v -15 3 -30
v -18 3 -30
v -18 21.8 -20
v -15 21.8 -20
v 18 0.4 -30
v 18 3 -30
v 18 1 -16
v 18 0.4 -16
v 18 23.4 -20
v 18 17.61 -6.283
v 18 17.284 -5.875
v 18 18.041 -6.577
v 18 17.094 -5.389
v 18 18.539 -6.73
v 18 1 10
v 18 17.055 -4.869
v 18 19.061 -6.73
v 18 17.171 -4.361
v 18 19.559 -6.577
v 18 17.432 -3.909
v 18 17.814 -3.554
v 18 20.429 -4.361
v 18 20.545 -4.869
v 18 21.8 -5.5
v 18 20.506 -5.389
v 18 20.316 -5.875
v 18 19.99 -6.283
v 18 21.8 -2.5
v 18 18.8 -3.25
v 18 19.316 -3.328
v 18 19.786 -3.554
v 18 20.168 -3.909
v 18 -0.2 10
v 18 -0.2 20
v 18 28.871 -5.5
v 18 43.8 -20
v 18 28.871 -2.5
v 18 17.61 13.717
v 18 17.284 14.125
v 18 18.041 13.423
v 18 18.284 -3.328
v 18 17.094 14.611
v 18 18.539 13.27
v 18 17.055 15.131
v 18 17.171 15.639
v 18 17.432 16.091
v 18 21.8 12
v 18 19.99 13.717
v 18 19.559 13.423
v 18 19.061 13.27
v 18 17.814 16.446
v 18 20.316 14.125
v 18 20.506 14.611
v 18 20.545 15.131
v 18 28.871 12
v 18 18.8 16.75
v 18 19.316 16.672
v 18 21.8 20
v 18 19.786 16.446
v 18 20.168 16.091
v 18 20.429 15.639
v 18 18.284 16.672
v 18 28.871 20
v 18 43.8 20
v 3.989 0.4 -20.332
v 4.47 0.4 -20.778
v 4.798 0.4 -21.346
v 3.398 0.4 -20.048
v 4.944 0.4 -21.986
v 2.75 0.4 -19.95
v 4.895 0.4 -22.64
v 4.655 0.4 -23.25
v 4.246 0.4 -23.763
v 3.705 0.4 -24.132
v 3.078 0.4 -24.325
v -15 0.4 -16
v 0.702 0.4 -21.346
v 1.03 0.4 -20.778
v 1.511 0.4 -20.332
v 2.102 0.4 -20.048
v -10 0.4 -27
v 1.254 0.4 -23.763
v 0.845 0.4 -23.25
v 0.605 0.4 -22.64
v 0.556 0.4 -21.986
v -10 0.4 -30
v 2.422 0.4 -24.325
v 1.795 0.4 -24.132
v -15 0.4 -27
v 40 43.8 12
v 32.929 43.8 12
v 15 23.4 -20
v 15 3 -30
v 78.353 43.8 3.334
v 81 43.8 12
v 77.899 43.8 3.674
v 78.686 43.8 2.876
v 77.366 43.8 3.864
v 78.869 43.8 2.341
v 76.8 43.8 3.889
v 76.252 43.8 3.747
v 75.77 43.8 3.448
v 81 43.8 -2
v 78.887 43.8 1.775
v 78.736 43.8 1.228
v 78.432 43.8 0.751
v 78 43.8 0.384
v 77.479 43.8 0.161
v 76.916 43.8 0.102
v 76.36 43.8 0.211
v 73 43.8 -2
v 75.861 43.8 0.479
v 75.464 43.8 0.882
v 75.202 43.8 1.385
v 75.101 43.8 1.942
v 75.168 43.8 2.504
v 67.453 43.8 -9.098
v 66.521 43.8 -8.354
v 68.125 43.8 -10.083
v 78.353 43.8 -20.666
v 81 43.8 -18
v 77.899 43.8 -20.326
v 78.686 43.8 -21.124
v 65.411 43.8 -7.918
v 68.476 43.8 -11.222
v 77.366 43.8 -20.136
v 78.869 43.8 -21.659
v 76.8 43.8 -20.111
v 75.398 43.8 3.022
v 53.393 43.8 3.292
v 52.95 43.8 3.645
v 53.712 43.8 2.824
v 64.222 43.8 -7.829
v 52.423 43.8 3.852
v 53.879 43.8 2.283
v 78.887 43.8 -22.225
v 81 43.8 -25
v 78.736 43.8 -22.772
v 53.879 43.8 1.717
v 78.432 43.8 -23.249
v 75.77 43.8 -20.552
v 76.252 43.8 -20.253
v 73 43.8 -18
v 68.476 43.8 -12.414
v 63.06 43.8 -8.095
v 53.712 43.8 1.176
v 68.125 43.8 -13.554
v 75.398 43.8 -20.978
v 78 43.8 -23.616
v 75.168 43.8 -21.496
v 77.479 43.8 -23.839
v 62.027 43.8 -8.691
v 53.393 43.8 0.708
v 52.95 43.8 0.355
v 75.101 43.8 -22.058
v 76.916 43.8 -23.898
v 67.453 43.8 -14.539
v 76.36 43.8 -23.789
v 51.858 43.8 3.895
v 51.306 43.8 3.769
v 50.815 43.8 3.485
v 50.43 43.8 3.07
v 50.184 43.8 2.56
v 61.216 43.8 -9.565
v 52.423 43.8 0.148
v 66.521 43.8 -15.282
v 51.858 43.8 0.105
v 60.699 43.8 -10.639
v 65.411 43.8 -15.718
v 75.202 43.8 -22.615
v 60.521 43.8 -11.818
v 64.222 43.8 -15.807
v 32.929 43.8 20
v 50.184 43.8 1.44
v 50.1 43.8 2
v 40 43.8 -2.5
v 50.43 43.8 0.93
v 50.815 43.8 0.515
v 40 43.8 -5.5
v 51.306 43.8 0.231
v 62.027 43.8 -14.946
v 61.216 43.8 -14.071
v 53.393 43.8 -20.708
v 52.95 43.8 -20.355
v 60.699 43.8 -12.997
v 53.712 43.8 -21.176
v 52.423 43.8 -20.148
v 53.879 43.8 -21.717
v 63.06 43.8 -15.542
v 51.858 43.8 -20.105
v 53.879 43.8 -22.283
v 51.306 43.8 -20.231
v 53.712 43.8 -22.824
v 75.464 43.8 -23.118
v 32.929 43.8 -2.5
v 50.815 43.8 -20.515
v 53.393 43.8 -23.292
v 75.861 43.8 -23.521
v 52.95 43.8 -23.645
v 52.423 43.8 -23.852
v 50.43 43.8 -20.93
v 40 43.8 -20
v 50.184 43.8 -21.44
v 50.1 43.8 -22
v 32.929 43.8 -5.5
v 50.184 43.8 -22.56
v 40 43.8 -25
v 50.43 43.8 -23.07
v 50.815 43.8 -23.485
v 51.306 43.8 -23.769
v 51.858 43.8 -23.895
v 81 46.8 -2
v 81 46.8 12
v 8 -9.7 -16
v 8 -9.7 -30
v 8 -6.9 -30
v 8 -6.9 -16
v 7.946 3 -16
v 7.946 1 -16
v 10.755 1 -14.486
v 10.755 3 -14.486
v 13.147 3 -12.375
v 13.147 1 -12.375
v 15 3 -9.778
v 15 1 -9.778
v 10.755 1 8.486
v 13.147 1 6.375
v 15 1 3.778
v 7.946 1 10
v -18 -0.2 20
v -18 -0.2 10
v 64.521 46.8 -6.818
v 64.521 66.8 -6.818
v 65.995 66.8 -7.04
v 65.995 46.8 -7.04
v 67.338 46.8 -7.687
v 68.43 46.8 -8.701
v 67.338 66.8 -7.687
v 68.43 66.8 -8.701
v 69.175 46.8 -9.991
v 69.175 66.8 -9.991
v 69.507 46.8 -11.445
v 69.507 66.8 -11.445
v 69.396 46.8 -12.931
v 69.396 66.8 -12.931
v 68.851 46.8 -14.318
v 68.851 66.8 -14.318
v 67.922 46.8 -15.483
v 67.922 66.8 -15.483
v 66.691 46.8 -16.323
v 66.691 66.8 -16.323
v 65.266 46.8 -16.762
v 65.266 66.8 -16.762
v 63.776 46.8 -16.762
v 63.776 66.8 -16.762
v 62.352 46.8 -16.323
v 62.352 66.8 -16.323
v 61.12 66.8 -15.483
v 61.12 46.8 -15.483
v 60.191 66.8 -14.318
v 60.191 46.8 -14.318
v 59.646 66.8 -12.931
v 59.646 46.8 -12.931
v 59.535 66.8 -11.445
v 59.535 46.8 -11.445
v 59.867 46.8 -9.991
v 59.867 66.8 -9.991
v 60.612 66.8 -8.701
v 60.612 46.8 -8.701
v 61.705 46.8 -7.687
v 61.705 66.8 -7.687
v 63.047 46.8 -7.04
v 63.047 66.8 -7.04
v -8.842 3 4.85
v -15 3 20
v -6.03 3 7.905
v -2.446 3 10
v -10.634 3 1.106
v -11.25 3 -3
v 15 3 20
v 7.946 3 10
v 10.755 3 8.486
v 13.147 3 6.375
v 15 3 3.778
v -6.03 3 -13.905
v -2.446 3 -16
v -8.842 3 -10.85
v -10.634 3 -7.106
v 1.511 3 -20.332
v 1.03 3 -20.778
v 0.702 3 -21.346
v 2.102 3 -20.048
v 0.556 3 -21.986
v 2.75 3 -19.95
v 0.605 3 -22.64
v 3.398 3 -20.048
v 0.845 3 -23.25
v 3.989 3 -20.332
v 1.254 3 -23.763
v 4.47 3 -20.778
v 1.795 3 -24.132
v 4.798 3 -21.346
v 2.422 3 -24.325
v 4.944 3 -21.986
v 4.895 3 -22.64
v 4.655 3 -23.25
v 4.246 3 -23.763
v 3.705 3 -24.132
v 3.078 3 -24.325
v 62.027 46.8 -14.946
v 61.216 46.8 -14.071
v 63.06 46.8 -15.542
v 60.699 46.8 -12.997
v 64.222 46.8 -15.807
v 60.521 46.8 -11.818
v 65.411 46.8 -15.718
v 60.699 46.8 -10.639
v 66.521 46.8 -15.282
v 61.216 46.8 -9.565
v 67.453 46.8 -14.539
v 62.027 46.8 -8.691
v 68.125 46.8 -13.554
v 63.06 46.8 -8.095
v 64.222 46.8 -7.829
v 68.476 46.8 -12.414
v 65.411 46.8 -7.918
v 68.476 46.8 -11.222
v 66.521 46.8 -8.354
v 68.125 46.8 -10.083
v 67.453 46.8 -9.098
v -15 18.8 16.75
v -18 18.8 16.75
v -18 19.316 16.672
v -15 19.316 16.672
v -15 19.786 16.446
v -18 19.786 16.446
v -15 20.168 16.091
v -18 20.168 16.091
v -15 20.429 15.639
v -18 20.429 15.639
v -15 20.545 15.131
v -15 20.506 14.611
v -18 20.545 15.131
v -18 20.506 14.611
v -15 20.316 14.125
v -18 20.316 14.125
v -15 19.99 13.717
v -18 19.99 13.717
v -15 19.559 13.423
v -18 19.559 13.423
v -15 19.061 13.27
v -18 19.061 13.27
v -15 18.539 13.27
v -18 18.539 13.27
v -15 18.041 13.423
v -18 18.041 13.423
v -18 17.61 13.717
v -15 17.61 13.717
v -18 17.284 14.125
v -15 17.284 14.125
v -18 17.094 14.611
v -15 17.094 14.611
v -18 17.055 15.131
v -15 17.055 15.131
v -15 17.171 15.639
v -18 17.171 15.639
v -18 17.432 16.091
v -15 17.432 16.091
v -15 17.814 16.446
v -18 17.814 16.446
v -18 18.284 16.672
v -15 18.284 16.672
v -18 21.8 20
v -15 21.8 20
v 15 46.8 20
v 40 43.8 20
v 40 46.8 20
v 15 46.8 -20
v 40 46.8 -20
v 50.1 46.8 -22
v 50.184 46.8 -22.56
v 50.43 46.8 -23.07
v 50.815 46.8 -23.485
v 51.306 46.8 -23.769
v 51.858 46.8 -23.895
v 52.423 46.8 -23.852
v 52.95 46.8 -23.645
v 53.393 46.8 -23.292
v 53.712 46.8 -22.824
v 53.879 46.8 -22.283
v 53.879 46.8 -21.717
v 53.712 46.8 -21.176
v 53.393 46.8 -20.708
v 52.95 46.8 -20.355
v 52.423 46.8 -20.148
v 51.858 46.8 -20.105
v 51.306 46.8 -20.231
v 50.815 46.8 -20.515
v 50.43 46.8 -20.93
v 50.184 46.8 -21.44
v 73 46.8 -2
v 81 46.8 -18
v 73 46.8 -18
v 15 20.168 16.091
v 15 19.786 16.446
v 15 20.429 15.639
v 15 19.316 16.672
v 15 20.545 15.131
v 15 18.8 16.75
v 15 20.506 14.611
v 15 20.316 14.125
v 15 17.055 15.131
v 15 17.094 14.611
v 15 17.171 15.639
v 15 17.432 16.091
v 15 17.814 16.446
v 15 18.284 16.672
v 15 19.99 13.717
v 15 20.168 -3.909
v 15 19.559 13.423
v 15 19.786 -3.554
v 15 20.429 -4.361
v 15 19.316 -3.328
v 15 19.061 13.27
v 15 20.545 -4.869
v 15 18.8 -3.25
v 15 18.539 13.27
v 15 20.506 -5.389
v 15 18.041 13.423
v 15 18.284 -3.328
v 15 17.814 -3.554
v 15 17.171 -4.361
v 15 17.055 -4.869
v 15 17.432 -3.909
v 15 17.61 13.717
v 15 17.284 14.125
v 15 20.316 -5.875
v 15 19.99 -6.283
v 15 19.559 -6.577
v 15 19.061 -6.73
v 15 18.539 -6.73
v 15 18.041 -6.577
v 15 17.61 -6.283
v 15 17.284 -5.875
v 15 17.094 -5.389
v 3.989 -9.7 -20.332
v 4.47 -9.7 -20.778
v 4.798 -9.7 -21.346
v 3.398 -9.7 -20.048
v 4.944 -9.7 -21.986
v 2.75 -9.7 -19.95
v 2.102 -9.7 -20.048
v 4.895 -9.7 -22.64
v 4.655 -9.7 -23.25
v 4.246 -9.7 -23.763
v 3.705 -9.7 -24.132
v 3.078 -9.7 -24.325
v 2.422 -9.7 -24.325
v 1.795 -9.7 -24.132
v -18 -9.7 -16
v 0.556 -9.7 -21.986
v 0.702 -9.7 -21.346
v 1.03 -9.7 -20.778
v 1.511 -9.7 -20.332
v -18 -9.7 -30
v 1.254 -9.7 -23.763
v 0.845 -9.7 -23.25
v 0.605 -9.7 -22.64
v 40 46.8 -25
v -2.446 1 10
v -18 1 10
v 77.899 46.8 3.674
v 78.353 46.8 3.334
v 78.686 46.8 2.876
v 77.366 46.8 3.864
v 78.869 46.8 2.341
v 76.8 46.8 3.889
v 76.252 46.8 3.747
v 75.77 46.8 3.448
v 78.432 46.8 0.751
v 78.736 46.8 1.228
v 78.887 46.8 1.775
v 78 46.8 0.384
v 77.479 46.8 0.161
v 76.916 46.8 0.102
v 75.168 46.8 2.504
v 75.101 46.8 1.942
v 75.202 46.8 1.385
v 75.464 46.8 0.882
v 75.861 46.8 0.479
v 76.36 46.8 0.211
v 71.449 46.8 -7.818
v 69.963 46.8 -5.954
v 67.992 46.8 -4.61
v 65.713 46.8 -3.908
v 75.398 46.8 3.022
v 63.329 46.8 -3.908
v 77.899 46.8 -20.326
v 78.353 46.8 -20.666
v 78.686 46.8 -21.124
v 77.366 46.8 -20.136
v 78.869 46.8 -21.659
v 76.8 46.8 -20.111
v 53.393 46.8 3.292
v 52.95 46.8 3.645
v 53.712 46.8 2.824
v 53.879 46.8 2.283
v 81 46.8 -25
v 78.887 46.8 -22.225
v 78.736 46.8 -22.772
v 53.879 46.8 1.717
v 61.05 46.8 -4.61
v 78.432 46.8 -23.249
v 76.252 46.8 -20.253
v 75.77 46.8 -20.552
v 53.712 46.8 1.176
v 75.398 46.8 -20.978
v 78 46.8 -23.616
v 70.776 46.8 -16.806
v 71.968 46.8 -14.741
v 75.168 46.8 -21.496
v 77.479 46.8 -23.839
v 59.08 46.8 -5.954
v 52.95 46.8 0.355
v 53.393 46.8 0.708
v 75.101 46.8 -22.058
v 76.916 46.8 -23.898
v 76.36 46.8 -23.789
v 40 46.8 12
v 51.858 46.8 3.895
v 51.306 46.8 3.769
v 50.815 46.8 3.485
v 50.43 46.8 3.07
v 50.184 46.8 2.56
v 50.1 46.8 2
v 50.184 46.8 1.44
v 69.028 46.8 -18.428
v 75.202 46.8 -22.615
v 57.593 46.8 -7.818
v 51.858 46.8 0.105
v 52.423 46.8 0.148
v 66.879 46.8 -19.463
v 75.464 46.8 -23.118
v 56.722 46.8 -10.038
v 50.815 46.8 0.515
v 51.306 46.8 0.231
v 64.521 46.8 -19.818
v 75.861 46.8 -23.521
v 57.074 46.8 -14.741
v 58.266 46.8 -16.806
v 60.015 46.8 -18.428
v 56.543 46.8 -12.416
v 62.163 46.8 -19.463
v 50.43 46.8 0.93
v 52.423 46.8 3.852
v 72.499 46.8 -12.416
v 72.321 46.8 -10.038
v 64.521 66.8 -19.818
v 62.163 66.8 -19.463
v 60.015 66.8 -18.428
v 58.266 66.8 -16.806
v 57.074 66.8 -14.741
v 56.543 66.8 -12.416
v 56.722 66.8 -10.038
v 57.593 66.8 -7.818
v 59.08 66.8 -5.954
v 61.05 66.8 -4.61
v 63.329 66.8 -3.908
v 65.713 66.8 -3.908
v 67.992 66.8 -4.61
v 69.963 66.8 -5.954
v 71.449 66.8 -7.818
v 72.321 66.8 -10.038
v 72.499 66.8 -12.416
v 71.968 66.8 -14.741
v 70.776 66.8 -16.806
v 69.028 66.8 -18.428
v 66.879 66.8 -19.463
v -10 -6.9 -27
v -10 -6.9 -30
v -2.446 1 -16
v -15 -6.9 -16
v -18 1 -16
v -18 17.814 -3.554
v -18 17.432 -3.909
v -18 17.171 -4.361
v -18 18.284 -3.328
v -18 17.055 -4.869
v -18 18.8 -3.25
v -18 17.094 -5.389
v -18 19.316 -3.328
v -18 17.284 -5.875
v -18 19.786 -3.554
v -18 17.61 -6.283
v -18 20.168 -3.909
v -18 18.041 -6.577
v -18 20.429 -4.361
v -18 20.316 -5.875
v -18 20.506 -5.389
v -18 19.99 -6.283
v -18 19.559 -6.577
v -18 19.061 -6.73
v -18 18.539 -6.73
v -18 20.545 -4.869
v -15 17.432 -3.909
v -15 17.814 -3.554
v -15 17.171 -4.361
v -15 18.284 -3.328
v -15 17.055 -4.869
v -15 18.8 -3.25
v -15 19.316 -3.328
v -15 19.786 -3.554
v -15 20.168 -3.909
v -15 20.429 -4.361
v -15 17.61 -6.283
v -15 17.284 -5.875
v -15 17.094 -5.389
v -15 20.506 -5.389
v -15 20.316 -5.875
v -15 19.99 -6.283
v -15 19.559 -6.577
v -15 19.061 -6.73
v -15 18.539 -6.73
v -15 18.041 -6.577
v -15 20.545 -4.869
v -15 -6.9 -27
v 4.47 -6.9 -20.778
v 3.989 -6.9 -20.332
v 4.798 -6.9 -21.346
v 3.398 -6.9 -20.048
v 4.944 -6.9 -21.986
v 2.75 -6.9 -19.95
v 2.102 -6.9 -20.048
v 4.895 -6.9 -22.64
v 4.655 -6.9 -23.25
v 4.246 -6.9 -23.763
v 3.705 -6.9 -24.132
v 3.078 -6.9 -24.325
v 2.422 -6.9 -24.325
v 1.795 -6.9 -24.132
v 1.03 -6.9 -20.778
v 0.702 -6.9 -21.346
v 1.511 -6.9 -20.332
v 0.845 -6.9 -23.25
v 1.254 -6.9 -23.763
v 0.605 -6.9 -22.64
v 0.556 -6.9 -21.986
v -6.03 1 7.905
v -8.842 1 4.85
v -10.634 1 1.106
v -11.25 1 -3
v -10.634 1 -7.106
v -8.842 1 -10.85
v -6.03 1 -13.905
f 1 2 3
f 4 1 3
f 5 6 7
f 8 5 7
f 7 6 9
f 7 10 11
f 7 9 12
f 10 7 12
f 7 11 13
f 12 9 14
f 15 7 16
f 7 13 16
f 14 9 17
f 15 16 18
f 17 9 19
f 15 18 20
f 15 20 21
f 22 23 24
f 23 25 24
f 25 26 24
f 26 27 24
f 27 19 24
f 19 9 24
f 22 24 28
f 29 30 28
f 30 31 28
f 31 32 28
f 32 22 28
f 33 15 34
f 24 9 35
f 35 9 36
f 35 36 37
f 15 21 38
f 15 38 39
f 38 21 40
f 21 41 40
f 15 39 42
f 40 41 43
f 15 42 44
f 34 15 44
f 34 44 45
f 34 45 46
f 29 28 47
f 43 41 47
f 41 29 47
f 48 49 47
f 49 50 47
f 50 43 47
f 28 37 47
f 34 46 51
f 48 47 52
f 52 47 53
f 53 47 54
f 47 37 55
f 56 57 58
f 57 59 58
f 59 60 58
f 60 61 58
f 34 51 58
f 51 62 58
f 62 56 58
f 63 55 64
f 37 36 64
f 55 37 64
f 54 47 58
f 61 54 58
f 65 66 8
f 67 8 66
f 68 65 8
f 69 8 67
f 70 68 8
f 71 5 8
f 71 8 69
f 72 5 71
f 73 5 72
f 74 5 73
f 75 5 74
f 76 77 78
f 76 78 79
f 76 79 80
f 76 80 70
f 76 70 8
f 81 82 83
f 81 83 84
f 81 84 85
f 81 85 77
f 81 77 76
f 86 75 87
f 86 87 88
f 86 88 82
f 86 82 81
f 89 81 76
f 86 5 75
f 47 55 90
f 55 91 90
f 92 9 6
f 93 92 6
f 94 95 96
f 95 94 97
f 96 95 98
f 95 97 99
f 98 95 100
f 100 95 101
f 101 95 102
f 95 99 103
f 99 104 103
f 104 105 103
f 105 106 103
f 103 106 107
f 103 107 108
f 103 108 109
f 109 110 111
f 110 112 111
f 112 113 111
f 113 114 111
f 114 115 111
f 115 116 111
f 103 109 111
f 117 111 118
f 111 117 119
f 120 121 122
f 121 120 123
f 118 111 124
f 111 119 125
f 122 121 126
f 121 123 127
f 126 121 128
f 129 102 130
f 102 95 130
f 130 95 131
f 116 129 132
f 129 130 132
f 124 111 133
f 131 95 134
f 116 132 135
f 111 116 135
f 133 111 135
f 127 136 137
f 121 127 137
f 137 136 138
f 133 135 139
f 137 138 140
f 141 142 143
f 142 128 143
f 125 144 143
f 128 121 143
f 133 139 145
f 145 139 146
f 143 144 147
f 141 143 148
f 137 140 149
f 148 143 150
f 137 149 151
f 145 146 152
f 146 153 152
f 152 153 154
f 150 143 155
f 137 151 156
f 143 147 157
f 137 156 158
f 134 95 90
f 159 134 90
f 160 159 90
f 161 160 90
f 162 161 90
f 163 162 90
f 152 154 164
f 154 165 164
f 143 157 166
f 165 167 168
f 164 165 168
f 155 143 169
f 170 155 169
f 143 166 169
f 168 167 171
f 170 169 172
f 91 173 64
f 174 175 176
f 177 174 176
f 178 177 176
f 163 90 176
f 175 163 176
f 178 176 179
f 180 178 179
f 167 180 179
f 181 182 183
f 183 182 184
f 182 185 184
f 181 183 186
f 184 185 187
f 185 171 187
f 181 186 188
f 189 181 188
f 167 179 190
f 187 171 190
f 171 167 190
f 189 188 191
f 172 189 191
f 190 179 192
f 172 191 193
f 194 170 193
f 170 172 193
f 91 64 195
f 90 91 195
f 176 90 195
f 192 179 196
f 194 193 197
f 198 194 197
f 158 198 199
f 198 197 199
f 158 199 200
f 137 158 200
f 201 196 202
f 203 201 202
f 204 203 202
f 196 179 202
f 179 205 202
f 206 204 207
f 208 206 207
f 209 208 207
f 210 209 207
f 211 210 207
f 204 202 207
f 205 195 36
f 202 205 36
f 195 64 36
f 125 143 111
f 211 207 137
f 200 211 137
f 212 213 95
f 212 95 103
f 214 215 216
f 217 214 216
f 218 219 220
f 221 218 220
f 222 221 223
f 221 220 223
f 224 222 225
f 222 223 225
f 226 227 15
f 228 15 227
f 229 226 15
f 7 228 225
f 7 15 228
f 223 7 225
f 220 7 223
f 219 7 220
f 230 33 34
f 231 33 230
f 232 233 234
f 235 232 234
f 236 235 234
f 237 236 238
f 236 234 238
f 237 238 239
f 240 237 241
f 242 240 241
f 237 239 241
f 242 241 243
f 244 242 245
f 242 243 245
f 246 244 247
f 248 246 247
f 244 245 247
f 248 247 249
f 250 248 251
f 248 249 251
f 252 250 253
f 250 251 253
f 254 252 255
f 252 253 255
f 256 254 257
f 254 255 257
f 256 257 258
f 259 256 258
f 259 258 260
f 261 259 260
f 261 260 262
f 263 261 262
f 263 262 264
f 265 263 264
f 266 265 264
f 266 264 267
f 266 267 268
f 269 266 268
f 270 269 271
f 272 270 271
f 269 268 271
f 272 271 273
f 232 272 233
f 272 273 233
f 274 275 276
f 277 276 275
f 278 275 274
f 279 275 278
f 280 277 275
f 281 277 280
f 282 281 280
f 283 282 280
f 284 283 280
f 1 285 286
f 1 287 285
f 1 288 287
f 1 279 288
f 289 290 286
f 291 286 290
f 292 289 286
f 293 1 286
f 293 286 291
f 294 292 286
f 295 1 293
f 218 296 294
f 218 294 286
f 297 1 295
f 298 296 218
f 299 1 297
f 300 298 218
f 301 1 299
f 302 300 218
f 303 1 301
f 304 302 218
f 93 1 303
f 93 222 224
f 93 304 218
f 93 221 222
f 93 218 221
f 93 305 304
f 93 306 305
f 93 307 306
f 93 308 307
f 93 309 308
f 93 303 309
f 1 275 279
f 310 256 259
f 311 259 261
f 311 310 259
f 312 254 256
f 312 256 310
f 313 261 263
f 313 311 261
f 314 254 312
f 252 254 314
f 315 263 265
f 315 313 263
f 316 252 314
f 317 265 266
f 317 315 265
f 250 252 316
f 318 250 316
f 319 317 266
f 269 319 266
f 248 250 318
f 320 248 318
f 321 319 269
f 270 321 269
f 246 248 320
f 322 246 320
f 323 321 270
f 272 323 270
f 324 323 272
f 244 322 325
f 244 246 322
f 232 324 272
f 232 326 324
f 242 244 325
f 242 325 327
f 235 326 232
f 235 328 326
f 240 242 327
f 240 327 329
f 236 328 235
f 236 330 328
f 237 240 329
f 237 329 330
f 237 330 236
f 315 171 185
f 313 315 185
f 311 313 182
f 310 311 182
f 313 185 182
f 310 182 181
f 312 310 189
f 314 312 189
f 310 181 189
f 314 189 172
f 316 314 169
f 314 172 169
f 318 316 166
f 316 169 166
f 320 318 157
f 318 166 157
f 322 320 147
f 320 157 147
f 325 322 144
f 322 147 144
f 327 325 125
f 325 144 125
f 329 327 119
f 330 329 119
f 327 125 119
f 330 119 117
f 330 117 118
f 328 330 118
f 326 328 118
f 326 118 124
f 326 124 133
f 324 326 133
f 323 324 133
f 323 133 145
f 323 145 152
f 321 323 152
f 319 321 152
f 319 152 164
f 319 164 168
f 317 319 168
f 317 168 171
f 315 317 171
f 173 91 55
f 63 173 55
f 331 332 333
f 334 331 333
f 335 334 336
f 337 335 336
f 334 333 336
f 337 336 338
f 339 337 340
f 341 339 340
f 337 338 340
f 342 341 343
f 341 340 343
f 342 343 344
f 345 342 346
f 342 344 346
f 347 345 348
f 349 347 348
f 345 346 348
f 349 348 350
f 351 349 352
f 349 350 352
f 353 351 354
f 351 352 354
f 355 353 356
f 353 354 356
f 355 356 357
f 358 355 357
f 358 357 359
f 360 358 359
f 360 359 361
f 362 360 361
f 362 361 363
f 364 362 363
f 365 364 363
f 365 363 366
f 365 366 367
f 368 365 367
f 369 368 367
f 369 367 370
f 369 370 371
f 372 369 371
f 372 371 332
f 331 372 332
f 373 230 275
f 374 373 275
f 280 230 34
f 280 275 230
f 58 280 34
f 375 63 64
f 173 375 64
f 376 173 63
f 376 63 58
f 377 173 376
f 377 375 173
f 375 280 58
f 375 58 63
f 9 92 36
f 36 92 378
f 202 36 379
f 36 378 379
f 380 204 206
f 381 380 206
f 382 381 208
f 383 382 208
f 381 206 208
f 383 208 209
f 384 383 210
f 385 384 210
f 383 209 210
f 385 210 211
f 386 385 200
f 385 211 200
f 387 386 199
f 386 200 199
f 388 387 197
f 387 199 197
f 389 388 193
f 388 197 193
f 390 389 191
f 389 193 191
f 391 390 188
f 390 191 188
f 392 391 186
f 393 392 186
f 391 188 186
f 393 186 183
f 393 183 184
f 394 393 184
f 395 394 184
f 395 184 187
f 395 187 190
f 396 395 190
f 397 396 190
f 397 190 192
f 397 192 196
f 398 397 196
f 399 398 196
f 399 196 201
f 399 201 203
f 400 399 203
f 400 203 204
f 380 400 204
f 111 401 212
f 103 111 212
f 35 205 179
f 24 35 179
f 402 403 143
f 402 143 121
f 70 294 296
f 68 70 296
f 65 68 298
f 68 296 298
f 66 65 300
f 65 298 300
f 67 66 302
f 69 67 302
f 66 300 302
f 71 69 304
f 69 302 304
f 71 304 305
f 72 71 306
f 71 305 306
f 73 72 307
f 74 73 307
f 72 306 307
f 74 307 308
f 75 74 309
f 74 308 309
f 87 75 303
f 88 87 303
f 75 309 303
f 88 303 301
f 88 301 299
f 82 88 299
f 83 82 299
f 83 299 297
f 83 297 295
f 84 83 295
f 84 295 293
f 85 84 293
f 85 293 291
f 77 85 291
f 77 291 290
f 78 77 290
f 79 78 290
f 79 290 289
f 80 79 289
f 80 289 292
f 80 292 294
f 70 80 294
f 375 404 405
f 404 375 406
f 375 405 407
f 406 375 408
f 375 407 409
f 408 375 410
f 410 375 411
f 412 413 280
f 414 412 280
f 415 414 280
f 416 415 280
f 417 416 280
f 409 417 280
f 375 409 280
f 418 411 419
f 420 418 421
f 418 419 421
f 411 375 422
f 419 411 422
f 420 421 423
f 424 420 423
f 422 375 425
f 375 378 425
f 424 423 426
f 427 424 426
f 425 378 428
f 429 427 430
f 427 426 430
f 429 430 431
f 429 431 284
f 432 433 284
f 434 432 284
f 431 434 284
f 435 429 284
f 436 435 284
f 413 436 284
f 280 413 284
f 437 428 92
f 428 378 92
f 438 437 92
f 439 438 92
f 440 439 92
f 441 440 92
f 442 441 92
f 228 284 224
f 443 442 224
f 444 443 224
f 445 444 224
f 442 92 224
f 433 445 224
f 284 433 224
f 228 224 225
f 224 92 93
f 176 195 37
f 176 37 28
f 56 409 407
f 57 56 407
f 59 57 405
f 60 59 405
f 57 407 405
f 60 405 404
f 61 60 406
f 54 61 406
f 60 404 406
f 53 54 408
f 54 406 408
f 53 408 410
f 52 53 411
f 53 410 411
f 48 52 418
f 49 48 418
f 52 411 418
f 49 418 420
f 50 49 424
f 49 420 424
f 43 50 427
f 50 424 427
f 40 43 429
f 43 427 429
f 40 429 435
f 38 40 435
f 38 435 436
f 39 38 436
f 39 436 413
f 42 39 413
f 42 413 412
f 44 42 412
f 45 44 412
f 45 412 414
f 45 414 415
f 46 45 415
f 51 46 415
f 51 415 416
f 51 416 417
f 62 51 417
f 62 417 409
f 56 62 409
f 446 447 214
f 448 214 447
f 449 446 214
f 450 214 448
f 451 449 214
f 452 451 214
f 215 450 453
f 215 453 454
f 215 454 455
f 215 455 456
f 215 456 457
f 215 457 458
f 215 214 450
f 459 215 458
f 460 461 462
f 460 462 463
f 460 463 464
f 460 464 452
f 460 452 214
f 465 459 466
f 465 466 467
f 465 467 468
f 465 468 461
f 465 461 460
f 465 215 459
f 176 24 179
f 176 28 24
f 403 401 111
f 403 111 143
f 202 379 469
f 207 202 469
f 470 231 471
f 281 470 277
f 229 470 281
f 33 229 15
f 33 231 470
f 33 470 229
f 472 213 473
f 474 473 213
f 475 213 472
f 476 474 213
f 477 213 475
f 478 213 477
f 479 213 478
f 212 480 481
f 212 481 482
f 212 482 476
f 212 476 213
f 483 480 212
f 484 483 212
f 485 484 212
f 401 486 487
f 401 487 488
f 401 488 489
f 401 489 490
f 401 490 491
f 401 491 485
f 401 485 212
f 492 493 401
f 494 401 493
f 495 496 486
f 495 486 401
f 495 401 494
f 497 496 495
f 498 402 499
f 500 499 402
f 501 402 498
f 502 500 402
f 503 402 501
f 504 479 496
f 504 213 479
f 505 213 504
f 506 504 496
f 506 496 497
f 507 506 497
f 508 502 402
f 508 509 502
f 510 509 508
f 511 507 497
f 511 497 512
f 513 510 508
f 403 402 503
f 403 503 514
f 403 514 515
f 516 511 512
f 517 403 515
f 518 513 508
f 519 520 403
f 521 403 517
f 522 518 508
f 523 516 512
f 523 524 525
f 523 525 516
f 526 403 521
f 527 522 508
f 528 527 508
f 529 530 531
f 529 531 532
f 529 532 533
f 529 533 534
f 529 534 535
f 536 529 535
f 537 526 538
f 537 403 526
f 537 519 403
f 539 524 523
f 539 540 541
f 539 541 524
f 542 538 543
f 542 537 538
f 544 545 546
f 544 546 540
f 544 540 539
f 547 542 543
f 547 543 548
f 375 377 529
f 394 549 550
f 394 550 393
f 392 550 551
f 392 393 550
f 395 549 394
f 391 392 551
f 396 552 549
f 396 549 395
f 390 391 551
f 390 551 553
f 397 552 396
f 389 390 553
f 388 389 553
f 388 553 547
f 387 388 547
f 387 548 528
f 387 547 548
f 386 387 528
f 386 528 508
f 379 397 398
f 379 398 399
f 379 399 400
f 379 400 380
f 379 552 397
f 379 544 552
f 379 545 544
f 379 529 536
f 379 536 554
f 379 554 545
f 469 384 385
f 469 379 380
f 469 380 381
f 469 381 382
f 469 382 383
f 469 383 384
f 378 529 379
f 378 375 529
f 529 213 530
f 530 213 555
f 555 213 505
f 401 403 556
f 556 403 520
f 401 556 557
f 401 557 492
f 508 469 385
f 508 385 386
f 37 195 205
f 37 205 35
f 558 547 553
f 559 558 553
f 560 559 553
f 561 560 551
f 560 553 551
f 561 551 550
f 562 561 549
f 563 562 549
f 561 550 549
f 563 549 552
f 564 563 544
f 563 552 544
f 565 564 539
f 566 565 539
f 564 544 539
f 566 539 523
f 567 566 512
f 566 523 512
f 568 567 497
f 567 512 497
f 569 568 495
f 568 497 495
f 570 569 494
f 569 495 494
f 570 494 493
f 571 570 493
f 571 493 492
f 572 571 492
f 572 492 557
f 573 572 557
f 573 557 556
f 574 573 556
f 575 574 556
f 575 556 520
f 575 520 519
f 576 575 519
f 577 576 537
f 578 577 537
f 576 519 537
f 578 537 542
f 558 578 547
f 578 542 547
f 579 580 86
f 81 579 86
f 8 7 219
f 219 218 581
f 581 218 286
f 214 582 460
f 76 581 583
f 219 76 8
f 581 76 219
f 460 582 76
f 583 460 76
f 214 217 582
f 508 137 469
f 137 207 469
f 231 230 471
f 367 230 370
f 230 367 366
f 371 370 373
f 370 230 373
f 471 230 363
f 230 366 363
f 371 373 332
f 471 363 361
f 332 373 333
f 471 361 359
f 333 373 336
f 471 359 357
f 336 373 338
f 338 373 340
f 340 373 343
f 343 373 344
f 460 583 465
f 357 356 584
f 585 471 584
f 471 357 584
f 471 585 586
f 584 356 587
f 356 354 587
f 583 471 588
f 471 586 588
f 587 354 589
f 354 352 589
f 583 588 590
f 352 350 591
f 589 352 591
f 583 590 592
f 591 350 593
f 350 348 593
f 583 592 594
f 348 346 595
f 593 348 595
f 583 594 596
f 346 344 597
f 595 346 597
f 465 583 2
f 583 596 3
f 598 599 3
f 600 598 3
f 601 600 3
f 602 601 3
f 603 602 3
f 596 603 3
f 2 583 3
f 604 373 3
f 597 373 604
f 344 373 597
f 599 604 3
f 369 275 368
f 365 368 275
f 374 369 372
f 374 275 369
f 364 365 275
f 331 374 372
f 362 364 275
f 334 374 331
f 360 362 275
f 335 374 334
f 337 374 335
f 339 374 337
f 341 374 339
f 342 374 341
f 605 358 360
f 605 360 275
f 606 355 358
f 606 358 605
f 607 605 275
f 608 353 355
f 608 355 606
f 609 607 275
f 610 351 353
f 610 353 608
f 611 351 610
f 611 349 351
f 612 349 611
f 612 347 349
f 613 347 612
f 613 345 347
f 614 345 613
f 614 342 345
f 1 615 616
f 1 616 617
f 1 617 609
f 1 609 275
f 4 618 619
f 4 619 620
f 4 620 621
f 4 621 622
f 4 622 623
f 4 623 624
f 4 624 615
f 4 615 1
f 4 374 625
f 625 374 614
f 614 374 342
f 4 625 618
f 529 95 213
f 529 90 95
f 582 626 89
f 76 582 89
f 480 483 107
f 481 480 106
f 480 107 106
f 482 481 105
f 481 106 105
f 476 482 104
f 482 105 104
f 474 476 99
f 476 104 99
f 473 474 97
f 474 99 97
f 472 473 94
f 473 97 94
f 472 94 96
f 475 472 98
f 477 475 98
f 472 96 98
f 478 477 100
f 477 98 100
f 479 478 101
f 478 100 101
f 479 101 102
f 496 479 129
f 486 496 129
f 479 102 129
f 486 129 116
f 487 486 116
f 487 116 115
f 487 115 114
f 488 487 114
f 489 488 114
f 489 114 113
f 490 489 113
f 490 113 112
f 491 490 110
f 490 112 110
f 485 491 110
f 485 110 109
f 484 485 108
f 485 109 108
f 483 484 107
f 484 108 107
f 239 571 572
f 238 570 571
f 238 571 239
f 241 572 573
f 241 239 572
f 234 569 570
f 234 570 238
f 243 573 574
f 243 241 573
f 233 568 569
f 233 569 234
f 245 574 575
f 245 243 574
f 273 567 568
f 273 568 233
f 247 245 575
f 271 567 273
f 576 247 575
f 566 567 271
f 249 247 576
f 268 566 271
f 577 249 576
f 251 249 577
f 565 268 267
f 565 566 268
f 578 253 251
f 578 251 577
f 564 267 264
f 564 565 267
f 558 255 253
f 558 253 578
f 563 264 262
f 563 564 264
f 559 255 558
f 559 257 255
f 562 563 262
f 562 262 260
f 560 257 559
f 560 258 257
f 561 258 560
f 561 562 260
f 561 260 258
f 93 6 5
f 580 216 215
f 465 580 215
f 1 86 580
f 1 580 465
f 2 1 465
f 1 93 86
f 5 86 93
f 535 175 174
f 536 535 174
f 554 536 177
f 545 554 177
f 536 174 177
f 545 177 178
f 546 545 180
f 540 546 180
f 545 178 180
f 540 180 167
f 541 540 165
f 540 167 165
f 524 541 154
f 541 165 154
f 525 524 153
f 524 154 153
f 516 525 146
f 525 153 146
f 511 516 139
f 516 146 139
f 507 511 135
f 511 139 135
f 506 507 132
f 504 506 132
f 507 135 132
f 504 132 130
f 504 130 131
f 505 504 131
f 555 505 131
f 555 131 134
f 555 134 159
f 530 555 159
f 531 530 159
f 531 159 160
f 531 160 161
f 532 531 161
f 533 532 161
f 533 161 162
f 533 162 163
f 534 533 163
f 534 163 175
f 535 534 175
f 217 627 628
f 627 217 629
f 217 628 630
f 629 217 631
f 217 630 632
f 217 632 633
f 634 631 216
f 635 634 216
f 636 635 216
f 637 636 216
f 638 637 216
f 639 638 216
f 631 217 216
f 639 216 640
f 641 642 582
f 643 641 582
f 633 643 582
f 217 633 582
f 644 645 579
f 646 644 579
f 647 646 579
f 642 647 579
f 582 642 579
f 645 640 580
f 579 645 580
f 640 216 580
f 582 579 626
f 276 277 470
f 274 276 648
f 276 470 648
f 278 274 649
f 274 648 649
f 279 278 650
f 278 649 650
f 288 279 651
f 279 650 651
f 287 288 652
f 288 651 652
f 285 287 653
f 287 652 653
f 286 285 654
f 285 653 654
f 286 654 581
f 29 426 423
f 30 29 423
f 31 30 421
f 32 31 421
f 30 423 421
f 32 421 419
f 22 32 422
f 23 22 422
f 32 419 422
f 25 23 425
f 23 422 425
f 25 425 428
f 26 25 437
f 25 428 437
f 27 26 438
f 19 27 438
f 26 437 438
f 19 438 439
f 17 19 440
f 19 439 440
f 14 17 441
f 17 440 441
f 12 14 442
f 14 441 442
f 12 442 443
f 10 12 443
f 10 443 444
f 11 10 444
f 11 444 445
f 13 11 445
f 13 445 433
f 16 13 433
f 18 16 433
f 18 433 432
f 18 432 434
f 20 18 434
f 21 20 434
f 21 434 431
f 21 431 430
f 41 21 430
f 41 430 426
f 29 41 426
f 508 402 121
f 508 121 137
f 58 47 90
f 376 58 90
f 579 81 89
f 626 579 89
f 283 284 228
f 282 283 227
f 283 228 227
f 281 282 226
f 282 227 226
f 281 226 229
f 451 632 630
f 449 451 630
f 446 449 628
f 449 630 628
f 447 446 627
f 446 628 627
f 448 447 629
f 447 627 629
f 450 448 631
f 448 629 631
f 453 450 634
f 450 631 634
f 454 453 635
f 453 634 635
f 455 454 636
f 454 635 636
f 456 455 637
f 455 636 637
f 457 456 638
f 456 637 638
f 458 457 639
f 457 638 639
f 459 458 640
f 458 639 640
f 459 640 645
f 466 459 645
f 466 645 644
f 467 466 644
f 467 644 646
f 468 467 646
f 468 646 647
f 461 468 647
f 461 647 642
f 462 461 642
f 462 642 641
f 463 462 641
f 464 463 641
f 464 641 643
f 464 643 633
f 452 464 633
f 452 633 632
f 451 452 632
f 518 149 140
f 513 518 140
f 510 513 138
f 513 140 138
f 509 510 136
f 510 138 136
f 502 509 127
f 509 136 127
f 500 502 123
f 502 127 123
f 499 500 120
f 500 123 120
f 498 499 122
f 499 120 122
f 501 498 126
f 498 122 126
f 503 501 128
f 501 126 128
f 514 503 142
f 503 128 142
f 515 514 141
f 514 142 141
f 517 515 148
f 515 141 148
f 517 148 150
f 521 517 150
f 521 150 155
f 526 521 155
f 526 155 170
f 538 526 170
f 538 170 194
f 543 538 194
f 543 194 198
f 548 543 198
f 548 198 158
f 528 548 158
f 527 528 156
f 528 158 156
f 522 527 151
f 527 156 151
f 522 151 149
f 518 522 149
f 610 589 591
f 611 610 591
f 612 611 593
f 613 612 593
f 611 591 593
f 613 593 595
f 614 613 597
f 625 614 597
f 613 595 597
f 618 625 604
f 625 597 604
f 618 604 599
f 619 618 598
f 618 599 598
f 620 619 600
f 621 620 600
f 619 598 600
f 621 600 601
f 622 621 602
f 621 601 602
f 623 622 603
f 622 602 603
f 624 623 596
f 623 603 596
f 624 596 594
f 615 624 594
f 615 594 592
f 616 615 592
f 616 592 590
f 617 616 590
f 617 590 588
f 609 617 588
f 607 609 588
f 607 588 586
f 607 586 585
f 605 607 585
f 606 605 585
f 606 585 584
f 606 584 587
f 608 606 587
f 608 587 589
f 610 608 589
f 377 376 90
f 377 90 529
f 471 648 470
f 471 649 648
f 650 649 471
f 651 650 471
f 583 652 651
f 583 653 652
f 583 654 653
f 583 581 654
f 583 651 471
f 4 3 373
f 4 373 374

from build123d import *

# Parameters (mm, degrees)
SKETCH_1_W            = 36
SKETCH_1_H            = 40
EXTRUDE_1_DEPTH       = 3
SKETCH_2_W            = 3
SKETCH_2_H            = 40
EXTRUDE_2_DEPTH       = 18.8
SKETCH_3_R            = 14
CUT_EXTRUDE_1_DEPTH   = 9
SKETCH_4_W            = 36
SKETCH_4_H            = 3
EXTRUDE_3_DEPTH       = 10
SKETCH_6_R            = 2.7
CUT_EXTRUDE_3_DEPTH   = 10
SKETCH_7_R            = 1.75
CUT_EXTRUDE_4_DEPTH   = 52.68404009
SKETCH_9_W            = 25
SKETCH_9_H            = 3
SKETCH_9_W_2          = 3
SKETCH_9_H_2          = 9.3
EXTRUDE_4_DEPTH       = 20
CHAMFER_1_SIZE        = 5
CUT_EXTRUDE_START     = -30
SKETCH_10_R           = 2.7
CUT_EXTRUDE_5_DEPTH   = 30
SKETCH_11_W           = 40.05397725
SKETCH_11_H           = 18.071111192
CUT_EXTRUDE_6_DEPTH   = 52.68404009
EXTRUDE_START         = 2.5
SKETCH_12_W           = 36
SKETCH_12_H           = 20
SKETCH_12_R           = 2.7
EXTRUDE_5_DEPTH       = 2.5
SKETCH_13_W           = 62.12277329
SKETCH_13_H           = 35.561448302
CUT_EXTRUDE_7_DEPTH   = 1
SKETCH_16_W           = 60
SKETCH_16_H           = 3
SKETCH_16_W_2         = 3
SKETCH_16_H_2         = 25
EXTRUDE_7_DEPTH       = 65
EXTRUDE_START_2       = 8
EXTRUDE_8_DEPTH       = 8
SKETCH_19_W           = 125.229267156
SKETCH_19_H           = 103.922898786
CUT_EXTRUDE_9_DEPTH   = 0.5
SKETCH_20_W           = 154.797288569
SKETCH_20_H           = 90.443359613
CUT_EXTRUDE_10_DEPTH  = 1.8
SKETCH_21_W           = 11.155684717
SKETCH_21_H           = 2.603751016
EXTRUDE_9_DEPTH       = 3
EXTRUDE_10_DEPTH      = 10
EXTRUDE_10_DEPTH_BACK = 4
SKETCH_22_W           = 36
SKETCH_22_H           = 3.2
SKETCH_23_R           = 1.75
CUT_EXTRUDE_12_DEPTH  = 10
SKETCH_26_W           = 12.845915964
SKETCH_26_H           = 7.377373426
EXTRUDE_11_DEPTH      = 3.2
SKETCH_27_W           = 116.42408431
SKETCH_27_H           = 62.505927617
CUT_EXTRUDE_13_DEPTH  = 10
SKETCH_29_W           = 89.791123847
SKETCH_29_H           = 12.28472202
SKETCH_29_W_2         = 107.401489541
SKETCH_29_H_2         = 29.785433334
CUT_EXTRUDE_14_DEPTH  = 25
SKETCH_30_W           = 3
SKETCH_30_H           = 18.8
EXTRUDE_12_DEPTH      = 17
SKETCH_31_W           = 80.768529078
SKETCH_31_H           = 45.765209612
CUT_EXTRUDE_15_DEPTH  = 0.6
SKETCH_32_W           = 23
SKETCH_32_H           = 2.8
SKETCH_32_W_2         = 3
SKETCH_32_H_2         = 9.9
EXTRUDE_13_DEPTH      = 14
SKETCH_34_R           = 2.2
CUT_EXTRUDE_17_DEPTH  = 97.806198149
SKETCH_35_W           = 168.711651586
SKETCH_35_H           = 128.925269833
CUT_EXTRUDE_18_DEPTH  = 7
SKETCH_36_W           = 30.780953922
SKETCH_36_H           = 20.383466973
CUT_EXTRUDE_19_DEPTH  = 43.8
SKETCH_38_W           = 37
SKETCH_38_H           = 5
CUT_EXTRUDE_20_DEPTH  = 10
SKETCH_45_W           = 37
SKETCH_45_H           = 3
EXTRUDE_14_DEPTH      = 3
HOLE_WIZARD_1_D       = 3.8
SKETCH_51_W           = 37
SKETCH_51_H           = 8
CUT_EXTRUDE_21_DEPTH  = 10
EXTRUDE_15_DEPTH      = 3
EXTRUDE_16_DEPTH      = 3
EXTRUDE_17_DEPTH      = 8
EXTRUDE_18_DEPTH      = 1.5
SKETCH_58_W           = 5
SKETCH_58_H           = 7.3
EXTRUDE_19_DEPTH      = 3
SKETCH_59_W           = 38
SKETCH_59_H           = 5
EXTRUDE_20_DEPTH      = 3
HOLE_WIZARD_2_D       = 3.8
SKETCH_62_W           = 37
SKETCH_62_H           = 3
EXTRUDE_21_DEPTH      = 3
HOLE_WIZARD_3_D       = 3.8
HOLE_WIZARD_3_DEPTH   = 56.5
SKETCH_65_W           = 8
SKETCH_65_H           = 16
CUT_EXTRUDE_22_DEPTH  = 10
SKETCH_73_R           = 8
EXTRUDE_22_DEPTH      = 20
SKETCH_74_R           = 5
CUT_EXTRUDE_23_DEPTH  = 20
HOLE_WIZARD_4_D       = 8


with BuildPart() as part:
    # 草图1 → 凸台-拉伸1 (new body)
    with BuildSketch(Plane(origin=(0, 0, 0), x_dir=(1, 0, 0), z_dir=(0, 1, 0))):
        Rectangle(SKETCH_1_W, SKETCH_1_H)
    extrude(amount=EXTRUDE_1_DEPTH)

    # 草图2 → 凸台-拉伸2 (add)
    with BuildSketch(Plane(origin=(0, 3, 0), x_dir=(1, 0, 0), z_dir=(0, 1, 0))):
        with Locations((-16.5, 0)):
            Rectangle(SKETCH_2_W, SKETCH_2_H)
        with Locations((16.5, 0)):
            Rectangle(SKETCH_2_W, SKETCH_2_H)
    extrude(amount=EXTRUDE_2_DEPTH)

    # 草图3 → 切除-拉伸1 (cut)
    with BuildSketch(Plane(origin=(0, 0, 0), x_dir=(-1, 0, 0), z_dir=(0, -1, 0))):
        with Locations(Location((-2.75, 3.000025, 0), (0, 0, 90))):
            Circle(SKETCH_3_R)
    extrude(amount=-CUT_EXTRUDE_1_DEPTH, mode=Mode.SUBTRACT)

    # 草图4 → 凸台-拉伸3 (add)
    with BuildSketch(Plane.XY.offset(20)):
        with Locations((0, 1.5)):
            Rectangle(SKETCH_4_W, SKETCH_4_H)
    extrude(amount=EXTRUDE_3_DEPTH)

    # 草图6 → 切除-拉伸3 (cut)
    with BuildSketch(Plane(origin=(0, 0, 0), x_dir=(-1, 0, 0), z_dir=(0, -1, 0))):
        with Locations(Location((-2.75, -16.149975, 0), (0, 0, 90))):
            Circle(SKETCH_6_R)
    extrude(amount=-CUT_EXTRUDE_3_DEPTH, mode=Mode.SUBTRACT)

    # 草图7 → 切除-拉伸4 (cut, through all)
    with BuildSketch(Plane.ZY.offset(18)):
        with Locations((15, 18.8)):
            Circle(SKETCH_7_R)
        with Locations((-5, 18.8)):
            Circle(SKETCH_7_R)
    extrude(amount=-CUT_EXTRUDE_4_DEPTH, mode=Mode.SUBTRACT)

    # 草图9 → 凸台-拉伸4 (add)
    with BuildSketch(Plane.XY.offset(30)):
        with Locations((-2.5, -7.8)):
            Rectangle(SKETCH_9_W, SKETCH_9_H)
        with Locations((-16.5, -4.65)):
            Rectangle(SKETCH_9_W_2, SKETCH_9_H_2)
    extrude(amount=-EXTRUDE_4_DEPTH)

    # 倒角1
    chamfer_1_edges = [part.edges().sort_by_distance(p)[0] for p in [
        (10, -7.8, 30),
    ]]
    chamfer(chamfer_1_edges, length=CHAMFER_1_SIZE)

    # 草图10 → 切除-拉伸5 (cut)
    with BuildSketch(Plane(origin=(0, 0, 0), x_dir=(1, 0, 0), z_dir=(0, 1, 0)).offset(CUT_EXTRUDE_START)):
        with Locations(Location((2.75, -16.149975, 0), (0, 0, 90))):
            Circle(SKETCH_10_R)
    extrude(amount=CUT_EXTRUDE_5_DEPTH, mode=Mode.SUBTRACT)

    # 草图11 → 切除-拉伸6 (cut, through all)
    with BuildSketch(Plane.ZY.offset(18)):
        with Locations((20.026988625, -9.035555596)):
            Rectangle(SKETCH_11_W, SKETCH_11_H)
    extrude(amount=-CUT_EXTRUDE_6_DEPTH, mode=Mode.SUBTRACT)

    # 草图12 → 凸台-拉伸5 (add)
    with BuildSketch(Plane(origin=(0, 0, 0), x_dir=(-1, 0, 0), z_dir=(0, -1, 0)).offset(EXTRUDE_START)):
        with Locations((0, -20)):
            Rectangle(SKETCH_12_W, SKETCH_12_H)
        with Locations(Location((-2.75, -16.149975, 0), (0, 0, 90))):
            Circle(SKETCH_12_R, mode=Mode.SUBTRACT)
    extrude(amount=-EXTRUDE_5_DEPTH)

    # 草图13 → 切除-拉伸7 (cut)
    with BuildSketch(Plane(origin=(0, 0, 0), x_dir=(-1, 0, 0), z_dir=(0, -1, 0))):
        with Locations((0.086945799, 7.780724151)):
            Rectangle(SKETCH_13_W, SKETCH_13_H)
    extrude(amount=-CUT_EXTRUDE_7_DEPTH, mode=Mode.SUBTRACT)

    # 草图16 → 凸台-拉伸7 (add)
    with BuildSketch(Plane.XY.offset(20)):
        with Locations((48, 45.3)):
            Rectangle(SKETCH_16_W, SKETCH_16_H)
        with Locations((16.5, 34.3)):
            Rectangle(SKETCH_16_W_2, SKETCH_16_H_2)
    extrude(amount=-EXTRUDE_7_DEPTH)

    # 草图17 → 凸台-拉伸8 (add)
    with BuildSketch(Plane(origin=(0, 9, 0), x_dir=(-1, 0, 0), z_dir=(0, -1, 0)).offset(EXTRUDE_START_2)):
        with BuildLine():
            Line((-15, -3.777695856), (-15, 9.777745856))
            ThreePointArc((-15, 9.777745856), (-16.75, 3.000025), (-15, -3.777695856))
        make_face()
    extrude(amount=-EXTRUDE_8_DEPTH)

    # 草图19 → 切除-拉伸9 (cut)
    with BuildSketch(Plane(origin=(0, -2.5, 0), x_dir=(-1, 0, 0), z_dir=(0, -1, 0))):
        with Locations((5.272239112, -16.1971882)):
            Rectangle(SKETCH_19_W, SKETCH_19_H)
    extrude(amount=-CUT_EXTRUDE_9_DEPTH, mode=Mode.SUBTRACT)

    # 草图20 → 切除-拉伸10 (cut)
    with BuildSketch(Plane(origin=(0, -2, 0), x_dir=(-1, 0, 0), z_dir=(0, -1, 0))):
        with Locations((2.880707968, -7.718123237)):
            Rectangle(SKETCH_20_W, SKETCH_20_H)
    extrude(amount=-CUT_EXTRUDE_10_DEPTH, mode=Mode.SUBTRACT)

    # 草图21 → 凸台-拉伸9 (add)
    with BuildSketch(Plane(origin=(0, 0, 0), x_dir=(1, 0, 0), z_dir=(0, 1, 0))):
        with Locations((3.131752483, -11.301875508)):
            Rectangle(SKETCH_21_W, SKETCH_21_H)
    extrude(amount=EXTRUDE_9_DEPTH)

    # 草图22 → 凸台-拉伸10 (add, two sides: drawn at the far end of the back side and taken through both)
    with BuildSketch(Plane(origin=(0, 0, -20), x_dir=(-1, 0, 0), z_dir=(0, 0, -1)).offset(-EXTRUDE_10_DEPTH_BACK)):
        with Locations((0, 1.4)):
            Rectangle(SKETCH_22_W, SKETCH_22_H)
    extrude(amount=EXTRUDE_10_DEPTH + EXTRUDE_10_DEPTH_BACK)

    # 草图23 → 切除-拉伸12 (cut)
    with BuildSketch(Plane(origin=(0, 9, 0), x_dir=(-1, 0, 0), z_dir=(0, -1, 0))):
        with Locations(Location((-2.75, 22.150025, 0), (0, 0, 270))):
            Circle(SKETCH_23_R)
    extrude(amount=CUT_EXTRUDE_12_DEPTH, mode=Mode.SUBTRACT)

    # 草图26 → 凸台-拉伸11 (add, through all)
    with BuildSketch(Plane(origin=(0, 3, 0), x_dir=(1, 0, 0), z_dir=(0, 1, 0))):
        with Locations((3.420651678, -16.929062366)):
            Rectangle(SKETCH_26_W, SKETCH_26_H)
    extrude(amount=-EXTRUDE_11_DEPTH)

    # 草图27 → 切除-拉伸13 (cut)
    with BuildSketch(Plane.XY.offset(30)):
        with Locations((4.783062287, -2.648783639)):
            Rectangle(SKETCH_27_W, SKETCH_27_H)
    extrude(amount=-CUT_EXTRUDE_13_DEPTH, mode=Mode.SUBTRACT)

    # 草图29 → 切除-拉伸14 (cut)
    with BuildSketch(Plane(origin=(0, 46.8, 0), x_dir=(1, 0, 0), z_dir=(0, 1, 0))):
        with Locations((43.319325488, 43.14236101)):
            Rectangle(SKETCH_29_W, SKETCH_29_H)
        with Locations((56.472746777, -26.892716667)):
            Rectangle(SKETCH_29_W_2, SKETCH_29_H_2)
    extrude(amount=-CUT_EXTRUDE_14_DEPTH, mode=Mode.SUBTRACT)

    # 草图30 → 凸台-拉伸12 (add)
    with BuildSketch(Plane(origin=(0, 0, -20), x_dir=(-1, 0, 0), z_dir=(0, 0, -1))):
        with Locations((-16.5, 12.4)):
            Rectangle(SKETCH_30_W, SKETCH_30_H)
    extrude(amount=EXTRUDE_12_DEPTH)

    # 草图31 → 切除-拉伸15 (cut)
    with BuildSketch(Plane(origin=(0, -0.2, 0), x_dir=(-1, 0, 0), z_dir=(0, -1, 0))):
        with Locations((-3.369884793, 29.731080354)):
            Rectangle(SKETCH_31_W, SKETCH_31_H)
    extrude(amount=-CUT_EXTRUDE_15_DEPTH, mode=Mode.SUBTRACT)

    # 草图32 → 凸台-拉伸13 (add)
    with BuildSketch(Plane(origin=(0, 0, -30), x_dir=(-1, 0, 0), z_dir=(0, 0, -1))):
        with Locations((3.5, -8.3)):
            Rectangle(SKETCH_32_W, SKETCH_32_H)
        with Locations((16.5, -1.95)):
            Rectangle(SKETCH_32_W_2, SKETCH_32_H_2)
        with Locations((16.5, -8.3)):
            Rectangle(SKETCH_32_W_2, SKETCH_32_H)
    extrude(amount=-EXTRUDE_13_DEPTH)

    # 草图34 → 切除-拉伸17 (cut, through all)
    with BuildSketch(Plane(origin=(0, 3, 0), x_dir=(1, 0, 0), z_dir=(0, 1, 0))):
        with Locations(Location((2.75, 22.150025, 0), (0, 0, 270))):
            Circle(SKETCH_34_R)
    extrude(amount=-CUT_EXTRUDE_17_DEPTH, mode=Mode.SUBTRACT)

    # 草图35 → 切除-拉伸18 (cut)
    with BuildSketch(Plane(origin=(0, 0, -37), x_dir=(-1, 0, 0), z_dir=(0, 0, -1))):
        with Locations((-14.403539842, 2.608943066)):
            Rectangle(SKETCH_35_W, SKETCH_35_H)
    extrude(amount=-CUT_EXTRUDE_18_DEPTH, mode=Mode.SUBTRACT)

    # 草图36 → 切除-拉伸19 (cut)
    with BuildSketch(Plane(origin=(0, 46.8, 0), x_dir=(1, 0, 0), z_dir=(0, 1, 0))):
        with Locations((25.609523039, 30.191733487)):
            Rectangle(SKETCH_36_W, SKETCH_36_H)
    extrude(amount=-CUT_EXTRUDE_19_DEPTH, mode=Mode.SUBTRACT)

    # 草图38 → 切除-拉伸20 (cut)
    with BuildSketch(Plane(origin=(0, 46.8, 0), x_dir=(1, 0, 0), z_dir=(0, 1, 0))):
        with Locations((59.5, 27.5)):
            Rectangle(SKETCH_38_W, SKETCH_38_H)
    extrude(amount=-CUT_EXTRUDE_20_DEPTH, mode=Mode.SUBTRACT)

    # 草图45 → 凸台-拉伸14 (add)
    with BuildSketch(Plane(origin=(0, 0, -25), x_dir=(-1, 0, 0), z_dir=(0, 0, -1))):
        with Locations((-59.5, 45.3)):
            Rectangle(SKETCH_45_W, SKETCH_45_H)
    extrude(amount=EXTRUDE_14_DEPTH)

    # 孔1 (through all)
    with Locations(Plane(origin=(0, 46.8, 0), x_dir=(1, 0, 0), z_dir=(0, 1, 0))):
        with Locations((52, 22), (52, -2), (77, 22), (77, -2)):
            Hole(HOLE_WIZARD_1_D / 2)

    # 草图51 → 切除-拉伸21 (cut)
    with BuildSketch(Plane(origin=(0, 46.8, 0), x_dir=(1, 0, 0), z_dir=(0, 1, 0))):
        with Locations((59.5, 24)):
            Rectangle(SKETCH_51_W, SKETCH_51_H)
    extrude(amount=-CUT_EXTRUDE_21_DEPTH, mode=Mode.SUBTRACT)

    # 草图52 → 凸台-拉伸15 (add)
    with BuildSketch(Plane.ZY.offset(18)):
        Polygon((-30, 3), (-20, 21.8), (-20, 3), align=None)
    extrude(amount=-EXTRUDE_15_DEPTH)

    # 草图54 → 凸台-拉伸16 (add)
    with BuildSketch(Plane(origin=(18, 0, 0), x_dir=(0, 0, -1), z_dir=(1, 0, 0))):
        Polygon((30, 3), (20, 3), (20, 23.4), align=None)
    extrude(amount=-EXTRUDE_16_DEPTH)

    # 草图55 → 凸台-拉伸17 (add)
    with BuildSketch(Plane.XY.offset(12)):
        Polygon((15, 21.8), (18, 21.8), (18, 28.871067812), (18, 43.8), (32.928932188, 43.8), (40, 43.8), (40, 46.8), (15, 46.8), align=None)
        Polygon((18, 28.871067812), (18, 21.8), (40, 43.8), (32.928932188, 43.8), align=None)
    extrude(amount=EXTRUDE_17_DEPTH)

    # 草图56 → 凸台-拉伸18 (add, symmetric)
    with BuildSketch(Plane.XY.offset(-4)):
        Polygon((18, 21.8), (40, 43.8), (32.928932188, 43.8), (18, 28.871067812), align=None)
    extrude(amount=EXTRUDE_18_DEPTH, both=True)

    # 草图58 → 凸台-拉伸19 (add)
    with BuildSketch(Plane(origin=(0, 0, -30), x_dir=(-1, 0, 0), z_dir=(0, 0, -1))):
        with Locations((12.5, -3.25)):
            Rectangle(SKETCH_58_W, SKETCH_58_H)
    extrude(amount=-EXTRUDE_19_DEPTH)

    # 草图59 → 凸台-拉伸20 (add)
    with BuildSketch(Plane(origin=(0, 46.8, 0), x_dir=(1, 0, 0), z_dir=(0, 1, 0))):
        with Locations((59, 22.5)):
            Rectangle(SKETCH_59_W, SKETCH_59_H)
    extrude(amount=-EXTRUDE_20_DEPTH)

    # 孔2 (through all)
    with Locations(Plane(origin=(0, 46.8, 0), x_dir=(1, 0, 0), z_dir=(0, 1, 0))):
        with Locations((52, 22), (77, 22)):
            Hole(HOLE_WIZARD_2_D / 2)

    # 草图62 → 凸台-拉伸21 (add)
    with BuildSketch(Plane(origin=(78, 0, 0), x_dir=(0, 0, -1), z_dir=(1, 0, 0))):
        with Locations((6.5, 45.3)):
            Rectangle(SKETCH_62_W, SKETCH_62_H)
    extrude(amount=EXTRUDE_21_DEPTH)

    # 孔3
    with Locations(Plane(origin=(0, 46.8, 0), x_dir=(1, 0, 0), z_dir=(0, 1, 0))):
        with Locations((77, -2), (77, 22)):
            Hole(HOLE_WIZARD_3_D / 2, depth=HOLE_WIZARD_3_DEPTH)

    # 草图65 → 切除-拉伸22 (cut)
    with BuildSketch(Plane(origin=(0, 46.8, 0), x_dir=(1, 0, 0), z_dir=(0, 1, 0))):
        with Locations((77, 10)):
            Rectangle(SKETCH_65_W, SKETCH_65_H)
    extrude(amount=-CUT_EXTRUDE_22_DEPTH, mode=Mode.SUBTRACT)

    # 草图73 → 凸台-拉伸22 (add)
    with BuildSketch(Plane(origin=(0, 46.8, 0), x_dir=(1, 0, 0), z_dir=(0, 1, 0))):
        with Locations(Location((64.521127225, 11.818194149, 0), (0, 0, 90))):
            Circle(SKETCH_73_R)
    extrude(amount=EXTRUDE_22_DEPTH)

    # 草图74 → 切除-拉伸23 (cut)
    with BuildSketch(Plane(origin=(0, 66.8, 0), x_dir=(1, 0, 0), z_dir=(0, 1, 0))):
        with Locations(Location((64.521127225, 11.818194149, 0), (0, 0, 270))):
            Circle(SKETCH_74_R)
    extrude(amount=-CUT_EXTRUDE_23_DEPTH, mode=Mode.SUBTRACT)

    # 孔4 (through all)
    with Locations(Plane(origin=(0, 46.8, 0), x_dir=(1, 0, 0), z_dir=(0, 1, 0))):
        with Locations((64.521127225, 11.818194149)):
            Hole(HOLE_WIZARD_4_D / 2)


solid = part.part
